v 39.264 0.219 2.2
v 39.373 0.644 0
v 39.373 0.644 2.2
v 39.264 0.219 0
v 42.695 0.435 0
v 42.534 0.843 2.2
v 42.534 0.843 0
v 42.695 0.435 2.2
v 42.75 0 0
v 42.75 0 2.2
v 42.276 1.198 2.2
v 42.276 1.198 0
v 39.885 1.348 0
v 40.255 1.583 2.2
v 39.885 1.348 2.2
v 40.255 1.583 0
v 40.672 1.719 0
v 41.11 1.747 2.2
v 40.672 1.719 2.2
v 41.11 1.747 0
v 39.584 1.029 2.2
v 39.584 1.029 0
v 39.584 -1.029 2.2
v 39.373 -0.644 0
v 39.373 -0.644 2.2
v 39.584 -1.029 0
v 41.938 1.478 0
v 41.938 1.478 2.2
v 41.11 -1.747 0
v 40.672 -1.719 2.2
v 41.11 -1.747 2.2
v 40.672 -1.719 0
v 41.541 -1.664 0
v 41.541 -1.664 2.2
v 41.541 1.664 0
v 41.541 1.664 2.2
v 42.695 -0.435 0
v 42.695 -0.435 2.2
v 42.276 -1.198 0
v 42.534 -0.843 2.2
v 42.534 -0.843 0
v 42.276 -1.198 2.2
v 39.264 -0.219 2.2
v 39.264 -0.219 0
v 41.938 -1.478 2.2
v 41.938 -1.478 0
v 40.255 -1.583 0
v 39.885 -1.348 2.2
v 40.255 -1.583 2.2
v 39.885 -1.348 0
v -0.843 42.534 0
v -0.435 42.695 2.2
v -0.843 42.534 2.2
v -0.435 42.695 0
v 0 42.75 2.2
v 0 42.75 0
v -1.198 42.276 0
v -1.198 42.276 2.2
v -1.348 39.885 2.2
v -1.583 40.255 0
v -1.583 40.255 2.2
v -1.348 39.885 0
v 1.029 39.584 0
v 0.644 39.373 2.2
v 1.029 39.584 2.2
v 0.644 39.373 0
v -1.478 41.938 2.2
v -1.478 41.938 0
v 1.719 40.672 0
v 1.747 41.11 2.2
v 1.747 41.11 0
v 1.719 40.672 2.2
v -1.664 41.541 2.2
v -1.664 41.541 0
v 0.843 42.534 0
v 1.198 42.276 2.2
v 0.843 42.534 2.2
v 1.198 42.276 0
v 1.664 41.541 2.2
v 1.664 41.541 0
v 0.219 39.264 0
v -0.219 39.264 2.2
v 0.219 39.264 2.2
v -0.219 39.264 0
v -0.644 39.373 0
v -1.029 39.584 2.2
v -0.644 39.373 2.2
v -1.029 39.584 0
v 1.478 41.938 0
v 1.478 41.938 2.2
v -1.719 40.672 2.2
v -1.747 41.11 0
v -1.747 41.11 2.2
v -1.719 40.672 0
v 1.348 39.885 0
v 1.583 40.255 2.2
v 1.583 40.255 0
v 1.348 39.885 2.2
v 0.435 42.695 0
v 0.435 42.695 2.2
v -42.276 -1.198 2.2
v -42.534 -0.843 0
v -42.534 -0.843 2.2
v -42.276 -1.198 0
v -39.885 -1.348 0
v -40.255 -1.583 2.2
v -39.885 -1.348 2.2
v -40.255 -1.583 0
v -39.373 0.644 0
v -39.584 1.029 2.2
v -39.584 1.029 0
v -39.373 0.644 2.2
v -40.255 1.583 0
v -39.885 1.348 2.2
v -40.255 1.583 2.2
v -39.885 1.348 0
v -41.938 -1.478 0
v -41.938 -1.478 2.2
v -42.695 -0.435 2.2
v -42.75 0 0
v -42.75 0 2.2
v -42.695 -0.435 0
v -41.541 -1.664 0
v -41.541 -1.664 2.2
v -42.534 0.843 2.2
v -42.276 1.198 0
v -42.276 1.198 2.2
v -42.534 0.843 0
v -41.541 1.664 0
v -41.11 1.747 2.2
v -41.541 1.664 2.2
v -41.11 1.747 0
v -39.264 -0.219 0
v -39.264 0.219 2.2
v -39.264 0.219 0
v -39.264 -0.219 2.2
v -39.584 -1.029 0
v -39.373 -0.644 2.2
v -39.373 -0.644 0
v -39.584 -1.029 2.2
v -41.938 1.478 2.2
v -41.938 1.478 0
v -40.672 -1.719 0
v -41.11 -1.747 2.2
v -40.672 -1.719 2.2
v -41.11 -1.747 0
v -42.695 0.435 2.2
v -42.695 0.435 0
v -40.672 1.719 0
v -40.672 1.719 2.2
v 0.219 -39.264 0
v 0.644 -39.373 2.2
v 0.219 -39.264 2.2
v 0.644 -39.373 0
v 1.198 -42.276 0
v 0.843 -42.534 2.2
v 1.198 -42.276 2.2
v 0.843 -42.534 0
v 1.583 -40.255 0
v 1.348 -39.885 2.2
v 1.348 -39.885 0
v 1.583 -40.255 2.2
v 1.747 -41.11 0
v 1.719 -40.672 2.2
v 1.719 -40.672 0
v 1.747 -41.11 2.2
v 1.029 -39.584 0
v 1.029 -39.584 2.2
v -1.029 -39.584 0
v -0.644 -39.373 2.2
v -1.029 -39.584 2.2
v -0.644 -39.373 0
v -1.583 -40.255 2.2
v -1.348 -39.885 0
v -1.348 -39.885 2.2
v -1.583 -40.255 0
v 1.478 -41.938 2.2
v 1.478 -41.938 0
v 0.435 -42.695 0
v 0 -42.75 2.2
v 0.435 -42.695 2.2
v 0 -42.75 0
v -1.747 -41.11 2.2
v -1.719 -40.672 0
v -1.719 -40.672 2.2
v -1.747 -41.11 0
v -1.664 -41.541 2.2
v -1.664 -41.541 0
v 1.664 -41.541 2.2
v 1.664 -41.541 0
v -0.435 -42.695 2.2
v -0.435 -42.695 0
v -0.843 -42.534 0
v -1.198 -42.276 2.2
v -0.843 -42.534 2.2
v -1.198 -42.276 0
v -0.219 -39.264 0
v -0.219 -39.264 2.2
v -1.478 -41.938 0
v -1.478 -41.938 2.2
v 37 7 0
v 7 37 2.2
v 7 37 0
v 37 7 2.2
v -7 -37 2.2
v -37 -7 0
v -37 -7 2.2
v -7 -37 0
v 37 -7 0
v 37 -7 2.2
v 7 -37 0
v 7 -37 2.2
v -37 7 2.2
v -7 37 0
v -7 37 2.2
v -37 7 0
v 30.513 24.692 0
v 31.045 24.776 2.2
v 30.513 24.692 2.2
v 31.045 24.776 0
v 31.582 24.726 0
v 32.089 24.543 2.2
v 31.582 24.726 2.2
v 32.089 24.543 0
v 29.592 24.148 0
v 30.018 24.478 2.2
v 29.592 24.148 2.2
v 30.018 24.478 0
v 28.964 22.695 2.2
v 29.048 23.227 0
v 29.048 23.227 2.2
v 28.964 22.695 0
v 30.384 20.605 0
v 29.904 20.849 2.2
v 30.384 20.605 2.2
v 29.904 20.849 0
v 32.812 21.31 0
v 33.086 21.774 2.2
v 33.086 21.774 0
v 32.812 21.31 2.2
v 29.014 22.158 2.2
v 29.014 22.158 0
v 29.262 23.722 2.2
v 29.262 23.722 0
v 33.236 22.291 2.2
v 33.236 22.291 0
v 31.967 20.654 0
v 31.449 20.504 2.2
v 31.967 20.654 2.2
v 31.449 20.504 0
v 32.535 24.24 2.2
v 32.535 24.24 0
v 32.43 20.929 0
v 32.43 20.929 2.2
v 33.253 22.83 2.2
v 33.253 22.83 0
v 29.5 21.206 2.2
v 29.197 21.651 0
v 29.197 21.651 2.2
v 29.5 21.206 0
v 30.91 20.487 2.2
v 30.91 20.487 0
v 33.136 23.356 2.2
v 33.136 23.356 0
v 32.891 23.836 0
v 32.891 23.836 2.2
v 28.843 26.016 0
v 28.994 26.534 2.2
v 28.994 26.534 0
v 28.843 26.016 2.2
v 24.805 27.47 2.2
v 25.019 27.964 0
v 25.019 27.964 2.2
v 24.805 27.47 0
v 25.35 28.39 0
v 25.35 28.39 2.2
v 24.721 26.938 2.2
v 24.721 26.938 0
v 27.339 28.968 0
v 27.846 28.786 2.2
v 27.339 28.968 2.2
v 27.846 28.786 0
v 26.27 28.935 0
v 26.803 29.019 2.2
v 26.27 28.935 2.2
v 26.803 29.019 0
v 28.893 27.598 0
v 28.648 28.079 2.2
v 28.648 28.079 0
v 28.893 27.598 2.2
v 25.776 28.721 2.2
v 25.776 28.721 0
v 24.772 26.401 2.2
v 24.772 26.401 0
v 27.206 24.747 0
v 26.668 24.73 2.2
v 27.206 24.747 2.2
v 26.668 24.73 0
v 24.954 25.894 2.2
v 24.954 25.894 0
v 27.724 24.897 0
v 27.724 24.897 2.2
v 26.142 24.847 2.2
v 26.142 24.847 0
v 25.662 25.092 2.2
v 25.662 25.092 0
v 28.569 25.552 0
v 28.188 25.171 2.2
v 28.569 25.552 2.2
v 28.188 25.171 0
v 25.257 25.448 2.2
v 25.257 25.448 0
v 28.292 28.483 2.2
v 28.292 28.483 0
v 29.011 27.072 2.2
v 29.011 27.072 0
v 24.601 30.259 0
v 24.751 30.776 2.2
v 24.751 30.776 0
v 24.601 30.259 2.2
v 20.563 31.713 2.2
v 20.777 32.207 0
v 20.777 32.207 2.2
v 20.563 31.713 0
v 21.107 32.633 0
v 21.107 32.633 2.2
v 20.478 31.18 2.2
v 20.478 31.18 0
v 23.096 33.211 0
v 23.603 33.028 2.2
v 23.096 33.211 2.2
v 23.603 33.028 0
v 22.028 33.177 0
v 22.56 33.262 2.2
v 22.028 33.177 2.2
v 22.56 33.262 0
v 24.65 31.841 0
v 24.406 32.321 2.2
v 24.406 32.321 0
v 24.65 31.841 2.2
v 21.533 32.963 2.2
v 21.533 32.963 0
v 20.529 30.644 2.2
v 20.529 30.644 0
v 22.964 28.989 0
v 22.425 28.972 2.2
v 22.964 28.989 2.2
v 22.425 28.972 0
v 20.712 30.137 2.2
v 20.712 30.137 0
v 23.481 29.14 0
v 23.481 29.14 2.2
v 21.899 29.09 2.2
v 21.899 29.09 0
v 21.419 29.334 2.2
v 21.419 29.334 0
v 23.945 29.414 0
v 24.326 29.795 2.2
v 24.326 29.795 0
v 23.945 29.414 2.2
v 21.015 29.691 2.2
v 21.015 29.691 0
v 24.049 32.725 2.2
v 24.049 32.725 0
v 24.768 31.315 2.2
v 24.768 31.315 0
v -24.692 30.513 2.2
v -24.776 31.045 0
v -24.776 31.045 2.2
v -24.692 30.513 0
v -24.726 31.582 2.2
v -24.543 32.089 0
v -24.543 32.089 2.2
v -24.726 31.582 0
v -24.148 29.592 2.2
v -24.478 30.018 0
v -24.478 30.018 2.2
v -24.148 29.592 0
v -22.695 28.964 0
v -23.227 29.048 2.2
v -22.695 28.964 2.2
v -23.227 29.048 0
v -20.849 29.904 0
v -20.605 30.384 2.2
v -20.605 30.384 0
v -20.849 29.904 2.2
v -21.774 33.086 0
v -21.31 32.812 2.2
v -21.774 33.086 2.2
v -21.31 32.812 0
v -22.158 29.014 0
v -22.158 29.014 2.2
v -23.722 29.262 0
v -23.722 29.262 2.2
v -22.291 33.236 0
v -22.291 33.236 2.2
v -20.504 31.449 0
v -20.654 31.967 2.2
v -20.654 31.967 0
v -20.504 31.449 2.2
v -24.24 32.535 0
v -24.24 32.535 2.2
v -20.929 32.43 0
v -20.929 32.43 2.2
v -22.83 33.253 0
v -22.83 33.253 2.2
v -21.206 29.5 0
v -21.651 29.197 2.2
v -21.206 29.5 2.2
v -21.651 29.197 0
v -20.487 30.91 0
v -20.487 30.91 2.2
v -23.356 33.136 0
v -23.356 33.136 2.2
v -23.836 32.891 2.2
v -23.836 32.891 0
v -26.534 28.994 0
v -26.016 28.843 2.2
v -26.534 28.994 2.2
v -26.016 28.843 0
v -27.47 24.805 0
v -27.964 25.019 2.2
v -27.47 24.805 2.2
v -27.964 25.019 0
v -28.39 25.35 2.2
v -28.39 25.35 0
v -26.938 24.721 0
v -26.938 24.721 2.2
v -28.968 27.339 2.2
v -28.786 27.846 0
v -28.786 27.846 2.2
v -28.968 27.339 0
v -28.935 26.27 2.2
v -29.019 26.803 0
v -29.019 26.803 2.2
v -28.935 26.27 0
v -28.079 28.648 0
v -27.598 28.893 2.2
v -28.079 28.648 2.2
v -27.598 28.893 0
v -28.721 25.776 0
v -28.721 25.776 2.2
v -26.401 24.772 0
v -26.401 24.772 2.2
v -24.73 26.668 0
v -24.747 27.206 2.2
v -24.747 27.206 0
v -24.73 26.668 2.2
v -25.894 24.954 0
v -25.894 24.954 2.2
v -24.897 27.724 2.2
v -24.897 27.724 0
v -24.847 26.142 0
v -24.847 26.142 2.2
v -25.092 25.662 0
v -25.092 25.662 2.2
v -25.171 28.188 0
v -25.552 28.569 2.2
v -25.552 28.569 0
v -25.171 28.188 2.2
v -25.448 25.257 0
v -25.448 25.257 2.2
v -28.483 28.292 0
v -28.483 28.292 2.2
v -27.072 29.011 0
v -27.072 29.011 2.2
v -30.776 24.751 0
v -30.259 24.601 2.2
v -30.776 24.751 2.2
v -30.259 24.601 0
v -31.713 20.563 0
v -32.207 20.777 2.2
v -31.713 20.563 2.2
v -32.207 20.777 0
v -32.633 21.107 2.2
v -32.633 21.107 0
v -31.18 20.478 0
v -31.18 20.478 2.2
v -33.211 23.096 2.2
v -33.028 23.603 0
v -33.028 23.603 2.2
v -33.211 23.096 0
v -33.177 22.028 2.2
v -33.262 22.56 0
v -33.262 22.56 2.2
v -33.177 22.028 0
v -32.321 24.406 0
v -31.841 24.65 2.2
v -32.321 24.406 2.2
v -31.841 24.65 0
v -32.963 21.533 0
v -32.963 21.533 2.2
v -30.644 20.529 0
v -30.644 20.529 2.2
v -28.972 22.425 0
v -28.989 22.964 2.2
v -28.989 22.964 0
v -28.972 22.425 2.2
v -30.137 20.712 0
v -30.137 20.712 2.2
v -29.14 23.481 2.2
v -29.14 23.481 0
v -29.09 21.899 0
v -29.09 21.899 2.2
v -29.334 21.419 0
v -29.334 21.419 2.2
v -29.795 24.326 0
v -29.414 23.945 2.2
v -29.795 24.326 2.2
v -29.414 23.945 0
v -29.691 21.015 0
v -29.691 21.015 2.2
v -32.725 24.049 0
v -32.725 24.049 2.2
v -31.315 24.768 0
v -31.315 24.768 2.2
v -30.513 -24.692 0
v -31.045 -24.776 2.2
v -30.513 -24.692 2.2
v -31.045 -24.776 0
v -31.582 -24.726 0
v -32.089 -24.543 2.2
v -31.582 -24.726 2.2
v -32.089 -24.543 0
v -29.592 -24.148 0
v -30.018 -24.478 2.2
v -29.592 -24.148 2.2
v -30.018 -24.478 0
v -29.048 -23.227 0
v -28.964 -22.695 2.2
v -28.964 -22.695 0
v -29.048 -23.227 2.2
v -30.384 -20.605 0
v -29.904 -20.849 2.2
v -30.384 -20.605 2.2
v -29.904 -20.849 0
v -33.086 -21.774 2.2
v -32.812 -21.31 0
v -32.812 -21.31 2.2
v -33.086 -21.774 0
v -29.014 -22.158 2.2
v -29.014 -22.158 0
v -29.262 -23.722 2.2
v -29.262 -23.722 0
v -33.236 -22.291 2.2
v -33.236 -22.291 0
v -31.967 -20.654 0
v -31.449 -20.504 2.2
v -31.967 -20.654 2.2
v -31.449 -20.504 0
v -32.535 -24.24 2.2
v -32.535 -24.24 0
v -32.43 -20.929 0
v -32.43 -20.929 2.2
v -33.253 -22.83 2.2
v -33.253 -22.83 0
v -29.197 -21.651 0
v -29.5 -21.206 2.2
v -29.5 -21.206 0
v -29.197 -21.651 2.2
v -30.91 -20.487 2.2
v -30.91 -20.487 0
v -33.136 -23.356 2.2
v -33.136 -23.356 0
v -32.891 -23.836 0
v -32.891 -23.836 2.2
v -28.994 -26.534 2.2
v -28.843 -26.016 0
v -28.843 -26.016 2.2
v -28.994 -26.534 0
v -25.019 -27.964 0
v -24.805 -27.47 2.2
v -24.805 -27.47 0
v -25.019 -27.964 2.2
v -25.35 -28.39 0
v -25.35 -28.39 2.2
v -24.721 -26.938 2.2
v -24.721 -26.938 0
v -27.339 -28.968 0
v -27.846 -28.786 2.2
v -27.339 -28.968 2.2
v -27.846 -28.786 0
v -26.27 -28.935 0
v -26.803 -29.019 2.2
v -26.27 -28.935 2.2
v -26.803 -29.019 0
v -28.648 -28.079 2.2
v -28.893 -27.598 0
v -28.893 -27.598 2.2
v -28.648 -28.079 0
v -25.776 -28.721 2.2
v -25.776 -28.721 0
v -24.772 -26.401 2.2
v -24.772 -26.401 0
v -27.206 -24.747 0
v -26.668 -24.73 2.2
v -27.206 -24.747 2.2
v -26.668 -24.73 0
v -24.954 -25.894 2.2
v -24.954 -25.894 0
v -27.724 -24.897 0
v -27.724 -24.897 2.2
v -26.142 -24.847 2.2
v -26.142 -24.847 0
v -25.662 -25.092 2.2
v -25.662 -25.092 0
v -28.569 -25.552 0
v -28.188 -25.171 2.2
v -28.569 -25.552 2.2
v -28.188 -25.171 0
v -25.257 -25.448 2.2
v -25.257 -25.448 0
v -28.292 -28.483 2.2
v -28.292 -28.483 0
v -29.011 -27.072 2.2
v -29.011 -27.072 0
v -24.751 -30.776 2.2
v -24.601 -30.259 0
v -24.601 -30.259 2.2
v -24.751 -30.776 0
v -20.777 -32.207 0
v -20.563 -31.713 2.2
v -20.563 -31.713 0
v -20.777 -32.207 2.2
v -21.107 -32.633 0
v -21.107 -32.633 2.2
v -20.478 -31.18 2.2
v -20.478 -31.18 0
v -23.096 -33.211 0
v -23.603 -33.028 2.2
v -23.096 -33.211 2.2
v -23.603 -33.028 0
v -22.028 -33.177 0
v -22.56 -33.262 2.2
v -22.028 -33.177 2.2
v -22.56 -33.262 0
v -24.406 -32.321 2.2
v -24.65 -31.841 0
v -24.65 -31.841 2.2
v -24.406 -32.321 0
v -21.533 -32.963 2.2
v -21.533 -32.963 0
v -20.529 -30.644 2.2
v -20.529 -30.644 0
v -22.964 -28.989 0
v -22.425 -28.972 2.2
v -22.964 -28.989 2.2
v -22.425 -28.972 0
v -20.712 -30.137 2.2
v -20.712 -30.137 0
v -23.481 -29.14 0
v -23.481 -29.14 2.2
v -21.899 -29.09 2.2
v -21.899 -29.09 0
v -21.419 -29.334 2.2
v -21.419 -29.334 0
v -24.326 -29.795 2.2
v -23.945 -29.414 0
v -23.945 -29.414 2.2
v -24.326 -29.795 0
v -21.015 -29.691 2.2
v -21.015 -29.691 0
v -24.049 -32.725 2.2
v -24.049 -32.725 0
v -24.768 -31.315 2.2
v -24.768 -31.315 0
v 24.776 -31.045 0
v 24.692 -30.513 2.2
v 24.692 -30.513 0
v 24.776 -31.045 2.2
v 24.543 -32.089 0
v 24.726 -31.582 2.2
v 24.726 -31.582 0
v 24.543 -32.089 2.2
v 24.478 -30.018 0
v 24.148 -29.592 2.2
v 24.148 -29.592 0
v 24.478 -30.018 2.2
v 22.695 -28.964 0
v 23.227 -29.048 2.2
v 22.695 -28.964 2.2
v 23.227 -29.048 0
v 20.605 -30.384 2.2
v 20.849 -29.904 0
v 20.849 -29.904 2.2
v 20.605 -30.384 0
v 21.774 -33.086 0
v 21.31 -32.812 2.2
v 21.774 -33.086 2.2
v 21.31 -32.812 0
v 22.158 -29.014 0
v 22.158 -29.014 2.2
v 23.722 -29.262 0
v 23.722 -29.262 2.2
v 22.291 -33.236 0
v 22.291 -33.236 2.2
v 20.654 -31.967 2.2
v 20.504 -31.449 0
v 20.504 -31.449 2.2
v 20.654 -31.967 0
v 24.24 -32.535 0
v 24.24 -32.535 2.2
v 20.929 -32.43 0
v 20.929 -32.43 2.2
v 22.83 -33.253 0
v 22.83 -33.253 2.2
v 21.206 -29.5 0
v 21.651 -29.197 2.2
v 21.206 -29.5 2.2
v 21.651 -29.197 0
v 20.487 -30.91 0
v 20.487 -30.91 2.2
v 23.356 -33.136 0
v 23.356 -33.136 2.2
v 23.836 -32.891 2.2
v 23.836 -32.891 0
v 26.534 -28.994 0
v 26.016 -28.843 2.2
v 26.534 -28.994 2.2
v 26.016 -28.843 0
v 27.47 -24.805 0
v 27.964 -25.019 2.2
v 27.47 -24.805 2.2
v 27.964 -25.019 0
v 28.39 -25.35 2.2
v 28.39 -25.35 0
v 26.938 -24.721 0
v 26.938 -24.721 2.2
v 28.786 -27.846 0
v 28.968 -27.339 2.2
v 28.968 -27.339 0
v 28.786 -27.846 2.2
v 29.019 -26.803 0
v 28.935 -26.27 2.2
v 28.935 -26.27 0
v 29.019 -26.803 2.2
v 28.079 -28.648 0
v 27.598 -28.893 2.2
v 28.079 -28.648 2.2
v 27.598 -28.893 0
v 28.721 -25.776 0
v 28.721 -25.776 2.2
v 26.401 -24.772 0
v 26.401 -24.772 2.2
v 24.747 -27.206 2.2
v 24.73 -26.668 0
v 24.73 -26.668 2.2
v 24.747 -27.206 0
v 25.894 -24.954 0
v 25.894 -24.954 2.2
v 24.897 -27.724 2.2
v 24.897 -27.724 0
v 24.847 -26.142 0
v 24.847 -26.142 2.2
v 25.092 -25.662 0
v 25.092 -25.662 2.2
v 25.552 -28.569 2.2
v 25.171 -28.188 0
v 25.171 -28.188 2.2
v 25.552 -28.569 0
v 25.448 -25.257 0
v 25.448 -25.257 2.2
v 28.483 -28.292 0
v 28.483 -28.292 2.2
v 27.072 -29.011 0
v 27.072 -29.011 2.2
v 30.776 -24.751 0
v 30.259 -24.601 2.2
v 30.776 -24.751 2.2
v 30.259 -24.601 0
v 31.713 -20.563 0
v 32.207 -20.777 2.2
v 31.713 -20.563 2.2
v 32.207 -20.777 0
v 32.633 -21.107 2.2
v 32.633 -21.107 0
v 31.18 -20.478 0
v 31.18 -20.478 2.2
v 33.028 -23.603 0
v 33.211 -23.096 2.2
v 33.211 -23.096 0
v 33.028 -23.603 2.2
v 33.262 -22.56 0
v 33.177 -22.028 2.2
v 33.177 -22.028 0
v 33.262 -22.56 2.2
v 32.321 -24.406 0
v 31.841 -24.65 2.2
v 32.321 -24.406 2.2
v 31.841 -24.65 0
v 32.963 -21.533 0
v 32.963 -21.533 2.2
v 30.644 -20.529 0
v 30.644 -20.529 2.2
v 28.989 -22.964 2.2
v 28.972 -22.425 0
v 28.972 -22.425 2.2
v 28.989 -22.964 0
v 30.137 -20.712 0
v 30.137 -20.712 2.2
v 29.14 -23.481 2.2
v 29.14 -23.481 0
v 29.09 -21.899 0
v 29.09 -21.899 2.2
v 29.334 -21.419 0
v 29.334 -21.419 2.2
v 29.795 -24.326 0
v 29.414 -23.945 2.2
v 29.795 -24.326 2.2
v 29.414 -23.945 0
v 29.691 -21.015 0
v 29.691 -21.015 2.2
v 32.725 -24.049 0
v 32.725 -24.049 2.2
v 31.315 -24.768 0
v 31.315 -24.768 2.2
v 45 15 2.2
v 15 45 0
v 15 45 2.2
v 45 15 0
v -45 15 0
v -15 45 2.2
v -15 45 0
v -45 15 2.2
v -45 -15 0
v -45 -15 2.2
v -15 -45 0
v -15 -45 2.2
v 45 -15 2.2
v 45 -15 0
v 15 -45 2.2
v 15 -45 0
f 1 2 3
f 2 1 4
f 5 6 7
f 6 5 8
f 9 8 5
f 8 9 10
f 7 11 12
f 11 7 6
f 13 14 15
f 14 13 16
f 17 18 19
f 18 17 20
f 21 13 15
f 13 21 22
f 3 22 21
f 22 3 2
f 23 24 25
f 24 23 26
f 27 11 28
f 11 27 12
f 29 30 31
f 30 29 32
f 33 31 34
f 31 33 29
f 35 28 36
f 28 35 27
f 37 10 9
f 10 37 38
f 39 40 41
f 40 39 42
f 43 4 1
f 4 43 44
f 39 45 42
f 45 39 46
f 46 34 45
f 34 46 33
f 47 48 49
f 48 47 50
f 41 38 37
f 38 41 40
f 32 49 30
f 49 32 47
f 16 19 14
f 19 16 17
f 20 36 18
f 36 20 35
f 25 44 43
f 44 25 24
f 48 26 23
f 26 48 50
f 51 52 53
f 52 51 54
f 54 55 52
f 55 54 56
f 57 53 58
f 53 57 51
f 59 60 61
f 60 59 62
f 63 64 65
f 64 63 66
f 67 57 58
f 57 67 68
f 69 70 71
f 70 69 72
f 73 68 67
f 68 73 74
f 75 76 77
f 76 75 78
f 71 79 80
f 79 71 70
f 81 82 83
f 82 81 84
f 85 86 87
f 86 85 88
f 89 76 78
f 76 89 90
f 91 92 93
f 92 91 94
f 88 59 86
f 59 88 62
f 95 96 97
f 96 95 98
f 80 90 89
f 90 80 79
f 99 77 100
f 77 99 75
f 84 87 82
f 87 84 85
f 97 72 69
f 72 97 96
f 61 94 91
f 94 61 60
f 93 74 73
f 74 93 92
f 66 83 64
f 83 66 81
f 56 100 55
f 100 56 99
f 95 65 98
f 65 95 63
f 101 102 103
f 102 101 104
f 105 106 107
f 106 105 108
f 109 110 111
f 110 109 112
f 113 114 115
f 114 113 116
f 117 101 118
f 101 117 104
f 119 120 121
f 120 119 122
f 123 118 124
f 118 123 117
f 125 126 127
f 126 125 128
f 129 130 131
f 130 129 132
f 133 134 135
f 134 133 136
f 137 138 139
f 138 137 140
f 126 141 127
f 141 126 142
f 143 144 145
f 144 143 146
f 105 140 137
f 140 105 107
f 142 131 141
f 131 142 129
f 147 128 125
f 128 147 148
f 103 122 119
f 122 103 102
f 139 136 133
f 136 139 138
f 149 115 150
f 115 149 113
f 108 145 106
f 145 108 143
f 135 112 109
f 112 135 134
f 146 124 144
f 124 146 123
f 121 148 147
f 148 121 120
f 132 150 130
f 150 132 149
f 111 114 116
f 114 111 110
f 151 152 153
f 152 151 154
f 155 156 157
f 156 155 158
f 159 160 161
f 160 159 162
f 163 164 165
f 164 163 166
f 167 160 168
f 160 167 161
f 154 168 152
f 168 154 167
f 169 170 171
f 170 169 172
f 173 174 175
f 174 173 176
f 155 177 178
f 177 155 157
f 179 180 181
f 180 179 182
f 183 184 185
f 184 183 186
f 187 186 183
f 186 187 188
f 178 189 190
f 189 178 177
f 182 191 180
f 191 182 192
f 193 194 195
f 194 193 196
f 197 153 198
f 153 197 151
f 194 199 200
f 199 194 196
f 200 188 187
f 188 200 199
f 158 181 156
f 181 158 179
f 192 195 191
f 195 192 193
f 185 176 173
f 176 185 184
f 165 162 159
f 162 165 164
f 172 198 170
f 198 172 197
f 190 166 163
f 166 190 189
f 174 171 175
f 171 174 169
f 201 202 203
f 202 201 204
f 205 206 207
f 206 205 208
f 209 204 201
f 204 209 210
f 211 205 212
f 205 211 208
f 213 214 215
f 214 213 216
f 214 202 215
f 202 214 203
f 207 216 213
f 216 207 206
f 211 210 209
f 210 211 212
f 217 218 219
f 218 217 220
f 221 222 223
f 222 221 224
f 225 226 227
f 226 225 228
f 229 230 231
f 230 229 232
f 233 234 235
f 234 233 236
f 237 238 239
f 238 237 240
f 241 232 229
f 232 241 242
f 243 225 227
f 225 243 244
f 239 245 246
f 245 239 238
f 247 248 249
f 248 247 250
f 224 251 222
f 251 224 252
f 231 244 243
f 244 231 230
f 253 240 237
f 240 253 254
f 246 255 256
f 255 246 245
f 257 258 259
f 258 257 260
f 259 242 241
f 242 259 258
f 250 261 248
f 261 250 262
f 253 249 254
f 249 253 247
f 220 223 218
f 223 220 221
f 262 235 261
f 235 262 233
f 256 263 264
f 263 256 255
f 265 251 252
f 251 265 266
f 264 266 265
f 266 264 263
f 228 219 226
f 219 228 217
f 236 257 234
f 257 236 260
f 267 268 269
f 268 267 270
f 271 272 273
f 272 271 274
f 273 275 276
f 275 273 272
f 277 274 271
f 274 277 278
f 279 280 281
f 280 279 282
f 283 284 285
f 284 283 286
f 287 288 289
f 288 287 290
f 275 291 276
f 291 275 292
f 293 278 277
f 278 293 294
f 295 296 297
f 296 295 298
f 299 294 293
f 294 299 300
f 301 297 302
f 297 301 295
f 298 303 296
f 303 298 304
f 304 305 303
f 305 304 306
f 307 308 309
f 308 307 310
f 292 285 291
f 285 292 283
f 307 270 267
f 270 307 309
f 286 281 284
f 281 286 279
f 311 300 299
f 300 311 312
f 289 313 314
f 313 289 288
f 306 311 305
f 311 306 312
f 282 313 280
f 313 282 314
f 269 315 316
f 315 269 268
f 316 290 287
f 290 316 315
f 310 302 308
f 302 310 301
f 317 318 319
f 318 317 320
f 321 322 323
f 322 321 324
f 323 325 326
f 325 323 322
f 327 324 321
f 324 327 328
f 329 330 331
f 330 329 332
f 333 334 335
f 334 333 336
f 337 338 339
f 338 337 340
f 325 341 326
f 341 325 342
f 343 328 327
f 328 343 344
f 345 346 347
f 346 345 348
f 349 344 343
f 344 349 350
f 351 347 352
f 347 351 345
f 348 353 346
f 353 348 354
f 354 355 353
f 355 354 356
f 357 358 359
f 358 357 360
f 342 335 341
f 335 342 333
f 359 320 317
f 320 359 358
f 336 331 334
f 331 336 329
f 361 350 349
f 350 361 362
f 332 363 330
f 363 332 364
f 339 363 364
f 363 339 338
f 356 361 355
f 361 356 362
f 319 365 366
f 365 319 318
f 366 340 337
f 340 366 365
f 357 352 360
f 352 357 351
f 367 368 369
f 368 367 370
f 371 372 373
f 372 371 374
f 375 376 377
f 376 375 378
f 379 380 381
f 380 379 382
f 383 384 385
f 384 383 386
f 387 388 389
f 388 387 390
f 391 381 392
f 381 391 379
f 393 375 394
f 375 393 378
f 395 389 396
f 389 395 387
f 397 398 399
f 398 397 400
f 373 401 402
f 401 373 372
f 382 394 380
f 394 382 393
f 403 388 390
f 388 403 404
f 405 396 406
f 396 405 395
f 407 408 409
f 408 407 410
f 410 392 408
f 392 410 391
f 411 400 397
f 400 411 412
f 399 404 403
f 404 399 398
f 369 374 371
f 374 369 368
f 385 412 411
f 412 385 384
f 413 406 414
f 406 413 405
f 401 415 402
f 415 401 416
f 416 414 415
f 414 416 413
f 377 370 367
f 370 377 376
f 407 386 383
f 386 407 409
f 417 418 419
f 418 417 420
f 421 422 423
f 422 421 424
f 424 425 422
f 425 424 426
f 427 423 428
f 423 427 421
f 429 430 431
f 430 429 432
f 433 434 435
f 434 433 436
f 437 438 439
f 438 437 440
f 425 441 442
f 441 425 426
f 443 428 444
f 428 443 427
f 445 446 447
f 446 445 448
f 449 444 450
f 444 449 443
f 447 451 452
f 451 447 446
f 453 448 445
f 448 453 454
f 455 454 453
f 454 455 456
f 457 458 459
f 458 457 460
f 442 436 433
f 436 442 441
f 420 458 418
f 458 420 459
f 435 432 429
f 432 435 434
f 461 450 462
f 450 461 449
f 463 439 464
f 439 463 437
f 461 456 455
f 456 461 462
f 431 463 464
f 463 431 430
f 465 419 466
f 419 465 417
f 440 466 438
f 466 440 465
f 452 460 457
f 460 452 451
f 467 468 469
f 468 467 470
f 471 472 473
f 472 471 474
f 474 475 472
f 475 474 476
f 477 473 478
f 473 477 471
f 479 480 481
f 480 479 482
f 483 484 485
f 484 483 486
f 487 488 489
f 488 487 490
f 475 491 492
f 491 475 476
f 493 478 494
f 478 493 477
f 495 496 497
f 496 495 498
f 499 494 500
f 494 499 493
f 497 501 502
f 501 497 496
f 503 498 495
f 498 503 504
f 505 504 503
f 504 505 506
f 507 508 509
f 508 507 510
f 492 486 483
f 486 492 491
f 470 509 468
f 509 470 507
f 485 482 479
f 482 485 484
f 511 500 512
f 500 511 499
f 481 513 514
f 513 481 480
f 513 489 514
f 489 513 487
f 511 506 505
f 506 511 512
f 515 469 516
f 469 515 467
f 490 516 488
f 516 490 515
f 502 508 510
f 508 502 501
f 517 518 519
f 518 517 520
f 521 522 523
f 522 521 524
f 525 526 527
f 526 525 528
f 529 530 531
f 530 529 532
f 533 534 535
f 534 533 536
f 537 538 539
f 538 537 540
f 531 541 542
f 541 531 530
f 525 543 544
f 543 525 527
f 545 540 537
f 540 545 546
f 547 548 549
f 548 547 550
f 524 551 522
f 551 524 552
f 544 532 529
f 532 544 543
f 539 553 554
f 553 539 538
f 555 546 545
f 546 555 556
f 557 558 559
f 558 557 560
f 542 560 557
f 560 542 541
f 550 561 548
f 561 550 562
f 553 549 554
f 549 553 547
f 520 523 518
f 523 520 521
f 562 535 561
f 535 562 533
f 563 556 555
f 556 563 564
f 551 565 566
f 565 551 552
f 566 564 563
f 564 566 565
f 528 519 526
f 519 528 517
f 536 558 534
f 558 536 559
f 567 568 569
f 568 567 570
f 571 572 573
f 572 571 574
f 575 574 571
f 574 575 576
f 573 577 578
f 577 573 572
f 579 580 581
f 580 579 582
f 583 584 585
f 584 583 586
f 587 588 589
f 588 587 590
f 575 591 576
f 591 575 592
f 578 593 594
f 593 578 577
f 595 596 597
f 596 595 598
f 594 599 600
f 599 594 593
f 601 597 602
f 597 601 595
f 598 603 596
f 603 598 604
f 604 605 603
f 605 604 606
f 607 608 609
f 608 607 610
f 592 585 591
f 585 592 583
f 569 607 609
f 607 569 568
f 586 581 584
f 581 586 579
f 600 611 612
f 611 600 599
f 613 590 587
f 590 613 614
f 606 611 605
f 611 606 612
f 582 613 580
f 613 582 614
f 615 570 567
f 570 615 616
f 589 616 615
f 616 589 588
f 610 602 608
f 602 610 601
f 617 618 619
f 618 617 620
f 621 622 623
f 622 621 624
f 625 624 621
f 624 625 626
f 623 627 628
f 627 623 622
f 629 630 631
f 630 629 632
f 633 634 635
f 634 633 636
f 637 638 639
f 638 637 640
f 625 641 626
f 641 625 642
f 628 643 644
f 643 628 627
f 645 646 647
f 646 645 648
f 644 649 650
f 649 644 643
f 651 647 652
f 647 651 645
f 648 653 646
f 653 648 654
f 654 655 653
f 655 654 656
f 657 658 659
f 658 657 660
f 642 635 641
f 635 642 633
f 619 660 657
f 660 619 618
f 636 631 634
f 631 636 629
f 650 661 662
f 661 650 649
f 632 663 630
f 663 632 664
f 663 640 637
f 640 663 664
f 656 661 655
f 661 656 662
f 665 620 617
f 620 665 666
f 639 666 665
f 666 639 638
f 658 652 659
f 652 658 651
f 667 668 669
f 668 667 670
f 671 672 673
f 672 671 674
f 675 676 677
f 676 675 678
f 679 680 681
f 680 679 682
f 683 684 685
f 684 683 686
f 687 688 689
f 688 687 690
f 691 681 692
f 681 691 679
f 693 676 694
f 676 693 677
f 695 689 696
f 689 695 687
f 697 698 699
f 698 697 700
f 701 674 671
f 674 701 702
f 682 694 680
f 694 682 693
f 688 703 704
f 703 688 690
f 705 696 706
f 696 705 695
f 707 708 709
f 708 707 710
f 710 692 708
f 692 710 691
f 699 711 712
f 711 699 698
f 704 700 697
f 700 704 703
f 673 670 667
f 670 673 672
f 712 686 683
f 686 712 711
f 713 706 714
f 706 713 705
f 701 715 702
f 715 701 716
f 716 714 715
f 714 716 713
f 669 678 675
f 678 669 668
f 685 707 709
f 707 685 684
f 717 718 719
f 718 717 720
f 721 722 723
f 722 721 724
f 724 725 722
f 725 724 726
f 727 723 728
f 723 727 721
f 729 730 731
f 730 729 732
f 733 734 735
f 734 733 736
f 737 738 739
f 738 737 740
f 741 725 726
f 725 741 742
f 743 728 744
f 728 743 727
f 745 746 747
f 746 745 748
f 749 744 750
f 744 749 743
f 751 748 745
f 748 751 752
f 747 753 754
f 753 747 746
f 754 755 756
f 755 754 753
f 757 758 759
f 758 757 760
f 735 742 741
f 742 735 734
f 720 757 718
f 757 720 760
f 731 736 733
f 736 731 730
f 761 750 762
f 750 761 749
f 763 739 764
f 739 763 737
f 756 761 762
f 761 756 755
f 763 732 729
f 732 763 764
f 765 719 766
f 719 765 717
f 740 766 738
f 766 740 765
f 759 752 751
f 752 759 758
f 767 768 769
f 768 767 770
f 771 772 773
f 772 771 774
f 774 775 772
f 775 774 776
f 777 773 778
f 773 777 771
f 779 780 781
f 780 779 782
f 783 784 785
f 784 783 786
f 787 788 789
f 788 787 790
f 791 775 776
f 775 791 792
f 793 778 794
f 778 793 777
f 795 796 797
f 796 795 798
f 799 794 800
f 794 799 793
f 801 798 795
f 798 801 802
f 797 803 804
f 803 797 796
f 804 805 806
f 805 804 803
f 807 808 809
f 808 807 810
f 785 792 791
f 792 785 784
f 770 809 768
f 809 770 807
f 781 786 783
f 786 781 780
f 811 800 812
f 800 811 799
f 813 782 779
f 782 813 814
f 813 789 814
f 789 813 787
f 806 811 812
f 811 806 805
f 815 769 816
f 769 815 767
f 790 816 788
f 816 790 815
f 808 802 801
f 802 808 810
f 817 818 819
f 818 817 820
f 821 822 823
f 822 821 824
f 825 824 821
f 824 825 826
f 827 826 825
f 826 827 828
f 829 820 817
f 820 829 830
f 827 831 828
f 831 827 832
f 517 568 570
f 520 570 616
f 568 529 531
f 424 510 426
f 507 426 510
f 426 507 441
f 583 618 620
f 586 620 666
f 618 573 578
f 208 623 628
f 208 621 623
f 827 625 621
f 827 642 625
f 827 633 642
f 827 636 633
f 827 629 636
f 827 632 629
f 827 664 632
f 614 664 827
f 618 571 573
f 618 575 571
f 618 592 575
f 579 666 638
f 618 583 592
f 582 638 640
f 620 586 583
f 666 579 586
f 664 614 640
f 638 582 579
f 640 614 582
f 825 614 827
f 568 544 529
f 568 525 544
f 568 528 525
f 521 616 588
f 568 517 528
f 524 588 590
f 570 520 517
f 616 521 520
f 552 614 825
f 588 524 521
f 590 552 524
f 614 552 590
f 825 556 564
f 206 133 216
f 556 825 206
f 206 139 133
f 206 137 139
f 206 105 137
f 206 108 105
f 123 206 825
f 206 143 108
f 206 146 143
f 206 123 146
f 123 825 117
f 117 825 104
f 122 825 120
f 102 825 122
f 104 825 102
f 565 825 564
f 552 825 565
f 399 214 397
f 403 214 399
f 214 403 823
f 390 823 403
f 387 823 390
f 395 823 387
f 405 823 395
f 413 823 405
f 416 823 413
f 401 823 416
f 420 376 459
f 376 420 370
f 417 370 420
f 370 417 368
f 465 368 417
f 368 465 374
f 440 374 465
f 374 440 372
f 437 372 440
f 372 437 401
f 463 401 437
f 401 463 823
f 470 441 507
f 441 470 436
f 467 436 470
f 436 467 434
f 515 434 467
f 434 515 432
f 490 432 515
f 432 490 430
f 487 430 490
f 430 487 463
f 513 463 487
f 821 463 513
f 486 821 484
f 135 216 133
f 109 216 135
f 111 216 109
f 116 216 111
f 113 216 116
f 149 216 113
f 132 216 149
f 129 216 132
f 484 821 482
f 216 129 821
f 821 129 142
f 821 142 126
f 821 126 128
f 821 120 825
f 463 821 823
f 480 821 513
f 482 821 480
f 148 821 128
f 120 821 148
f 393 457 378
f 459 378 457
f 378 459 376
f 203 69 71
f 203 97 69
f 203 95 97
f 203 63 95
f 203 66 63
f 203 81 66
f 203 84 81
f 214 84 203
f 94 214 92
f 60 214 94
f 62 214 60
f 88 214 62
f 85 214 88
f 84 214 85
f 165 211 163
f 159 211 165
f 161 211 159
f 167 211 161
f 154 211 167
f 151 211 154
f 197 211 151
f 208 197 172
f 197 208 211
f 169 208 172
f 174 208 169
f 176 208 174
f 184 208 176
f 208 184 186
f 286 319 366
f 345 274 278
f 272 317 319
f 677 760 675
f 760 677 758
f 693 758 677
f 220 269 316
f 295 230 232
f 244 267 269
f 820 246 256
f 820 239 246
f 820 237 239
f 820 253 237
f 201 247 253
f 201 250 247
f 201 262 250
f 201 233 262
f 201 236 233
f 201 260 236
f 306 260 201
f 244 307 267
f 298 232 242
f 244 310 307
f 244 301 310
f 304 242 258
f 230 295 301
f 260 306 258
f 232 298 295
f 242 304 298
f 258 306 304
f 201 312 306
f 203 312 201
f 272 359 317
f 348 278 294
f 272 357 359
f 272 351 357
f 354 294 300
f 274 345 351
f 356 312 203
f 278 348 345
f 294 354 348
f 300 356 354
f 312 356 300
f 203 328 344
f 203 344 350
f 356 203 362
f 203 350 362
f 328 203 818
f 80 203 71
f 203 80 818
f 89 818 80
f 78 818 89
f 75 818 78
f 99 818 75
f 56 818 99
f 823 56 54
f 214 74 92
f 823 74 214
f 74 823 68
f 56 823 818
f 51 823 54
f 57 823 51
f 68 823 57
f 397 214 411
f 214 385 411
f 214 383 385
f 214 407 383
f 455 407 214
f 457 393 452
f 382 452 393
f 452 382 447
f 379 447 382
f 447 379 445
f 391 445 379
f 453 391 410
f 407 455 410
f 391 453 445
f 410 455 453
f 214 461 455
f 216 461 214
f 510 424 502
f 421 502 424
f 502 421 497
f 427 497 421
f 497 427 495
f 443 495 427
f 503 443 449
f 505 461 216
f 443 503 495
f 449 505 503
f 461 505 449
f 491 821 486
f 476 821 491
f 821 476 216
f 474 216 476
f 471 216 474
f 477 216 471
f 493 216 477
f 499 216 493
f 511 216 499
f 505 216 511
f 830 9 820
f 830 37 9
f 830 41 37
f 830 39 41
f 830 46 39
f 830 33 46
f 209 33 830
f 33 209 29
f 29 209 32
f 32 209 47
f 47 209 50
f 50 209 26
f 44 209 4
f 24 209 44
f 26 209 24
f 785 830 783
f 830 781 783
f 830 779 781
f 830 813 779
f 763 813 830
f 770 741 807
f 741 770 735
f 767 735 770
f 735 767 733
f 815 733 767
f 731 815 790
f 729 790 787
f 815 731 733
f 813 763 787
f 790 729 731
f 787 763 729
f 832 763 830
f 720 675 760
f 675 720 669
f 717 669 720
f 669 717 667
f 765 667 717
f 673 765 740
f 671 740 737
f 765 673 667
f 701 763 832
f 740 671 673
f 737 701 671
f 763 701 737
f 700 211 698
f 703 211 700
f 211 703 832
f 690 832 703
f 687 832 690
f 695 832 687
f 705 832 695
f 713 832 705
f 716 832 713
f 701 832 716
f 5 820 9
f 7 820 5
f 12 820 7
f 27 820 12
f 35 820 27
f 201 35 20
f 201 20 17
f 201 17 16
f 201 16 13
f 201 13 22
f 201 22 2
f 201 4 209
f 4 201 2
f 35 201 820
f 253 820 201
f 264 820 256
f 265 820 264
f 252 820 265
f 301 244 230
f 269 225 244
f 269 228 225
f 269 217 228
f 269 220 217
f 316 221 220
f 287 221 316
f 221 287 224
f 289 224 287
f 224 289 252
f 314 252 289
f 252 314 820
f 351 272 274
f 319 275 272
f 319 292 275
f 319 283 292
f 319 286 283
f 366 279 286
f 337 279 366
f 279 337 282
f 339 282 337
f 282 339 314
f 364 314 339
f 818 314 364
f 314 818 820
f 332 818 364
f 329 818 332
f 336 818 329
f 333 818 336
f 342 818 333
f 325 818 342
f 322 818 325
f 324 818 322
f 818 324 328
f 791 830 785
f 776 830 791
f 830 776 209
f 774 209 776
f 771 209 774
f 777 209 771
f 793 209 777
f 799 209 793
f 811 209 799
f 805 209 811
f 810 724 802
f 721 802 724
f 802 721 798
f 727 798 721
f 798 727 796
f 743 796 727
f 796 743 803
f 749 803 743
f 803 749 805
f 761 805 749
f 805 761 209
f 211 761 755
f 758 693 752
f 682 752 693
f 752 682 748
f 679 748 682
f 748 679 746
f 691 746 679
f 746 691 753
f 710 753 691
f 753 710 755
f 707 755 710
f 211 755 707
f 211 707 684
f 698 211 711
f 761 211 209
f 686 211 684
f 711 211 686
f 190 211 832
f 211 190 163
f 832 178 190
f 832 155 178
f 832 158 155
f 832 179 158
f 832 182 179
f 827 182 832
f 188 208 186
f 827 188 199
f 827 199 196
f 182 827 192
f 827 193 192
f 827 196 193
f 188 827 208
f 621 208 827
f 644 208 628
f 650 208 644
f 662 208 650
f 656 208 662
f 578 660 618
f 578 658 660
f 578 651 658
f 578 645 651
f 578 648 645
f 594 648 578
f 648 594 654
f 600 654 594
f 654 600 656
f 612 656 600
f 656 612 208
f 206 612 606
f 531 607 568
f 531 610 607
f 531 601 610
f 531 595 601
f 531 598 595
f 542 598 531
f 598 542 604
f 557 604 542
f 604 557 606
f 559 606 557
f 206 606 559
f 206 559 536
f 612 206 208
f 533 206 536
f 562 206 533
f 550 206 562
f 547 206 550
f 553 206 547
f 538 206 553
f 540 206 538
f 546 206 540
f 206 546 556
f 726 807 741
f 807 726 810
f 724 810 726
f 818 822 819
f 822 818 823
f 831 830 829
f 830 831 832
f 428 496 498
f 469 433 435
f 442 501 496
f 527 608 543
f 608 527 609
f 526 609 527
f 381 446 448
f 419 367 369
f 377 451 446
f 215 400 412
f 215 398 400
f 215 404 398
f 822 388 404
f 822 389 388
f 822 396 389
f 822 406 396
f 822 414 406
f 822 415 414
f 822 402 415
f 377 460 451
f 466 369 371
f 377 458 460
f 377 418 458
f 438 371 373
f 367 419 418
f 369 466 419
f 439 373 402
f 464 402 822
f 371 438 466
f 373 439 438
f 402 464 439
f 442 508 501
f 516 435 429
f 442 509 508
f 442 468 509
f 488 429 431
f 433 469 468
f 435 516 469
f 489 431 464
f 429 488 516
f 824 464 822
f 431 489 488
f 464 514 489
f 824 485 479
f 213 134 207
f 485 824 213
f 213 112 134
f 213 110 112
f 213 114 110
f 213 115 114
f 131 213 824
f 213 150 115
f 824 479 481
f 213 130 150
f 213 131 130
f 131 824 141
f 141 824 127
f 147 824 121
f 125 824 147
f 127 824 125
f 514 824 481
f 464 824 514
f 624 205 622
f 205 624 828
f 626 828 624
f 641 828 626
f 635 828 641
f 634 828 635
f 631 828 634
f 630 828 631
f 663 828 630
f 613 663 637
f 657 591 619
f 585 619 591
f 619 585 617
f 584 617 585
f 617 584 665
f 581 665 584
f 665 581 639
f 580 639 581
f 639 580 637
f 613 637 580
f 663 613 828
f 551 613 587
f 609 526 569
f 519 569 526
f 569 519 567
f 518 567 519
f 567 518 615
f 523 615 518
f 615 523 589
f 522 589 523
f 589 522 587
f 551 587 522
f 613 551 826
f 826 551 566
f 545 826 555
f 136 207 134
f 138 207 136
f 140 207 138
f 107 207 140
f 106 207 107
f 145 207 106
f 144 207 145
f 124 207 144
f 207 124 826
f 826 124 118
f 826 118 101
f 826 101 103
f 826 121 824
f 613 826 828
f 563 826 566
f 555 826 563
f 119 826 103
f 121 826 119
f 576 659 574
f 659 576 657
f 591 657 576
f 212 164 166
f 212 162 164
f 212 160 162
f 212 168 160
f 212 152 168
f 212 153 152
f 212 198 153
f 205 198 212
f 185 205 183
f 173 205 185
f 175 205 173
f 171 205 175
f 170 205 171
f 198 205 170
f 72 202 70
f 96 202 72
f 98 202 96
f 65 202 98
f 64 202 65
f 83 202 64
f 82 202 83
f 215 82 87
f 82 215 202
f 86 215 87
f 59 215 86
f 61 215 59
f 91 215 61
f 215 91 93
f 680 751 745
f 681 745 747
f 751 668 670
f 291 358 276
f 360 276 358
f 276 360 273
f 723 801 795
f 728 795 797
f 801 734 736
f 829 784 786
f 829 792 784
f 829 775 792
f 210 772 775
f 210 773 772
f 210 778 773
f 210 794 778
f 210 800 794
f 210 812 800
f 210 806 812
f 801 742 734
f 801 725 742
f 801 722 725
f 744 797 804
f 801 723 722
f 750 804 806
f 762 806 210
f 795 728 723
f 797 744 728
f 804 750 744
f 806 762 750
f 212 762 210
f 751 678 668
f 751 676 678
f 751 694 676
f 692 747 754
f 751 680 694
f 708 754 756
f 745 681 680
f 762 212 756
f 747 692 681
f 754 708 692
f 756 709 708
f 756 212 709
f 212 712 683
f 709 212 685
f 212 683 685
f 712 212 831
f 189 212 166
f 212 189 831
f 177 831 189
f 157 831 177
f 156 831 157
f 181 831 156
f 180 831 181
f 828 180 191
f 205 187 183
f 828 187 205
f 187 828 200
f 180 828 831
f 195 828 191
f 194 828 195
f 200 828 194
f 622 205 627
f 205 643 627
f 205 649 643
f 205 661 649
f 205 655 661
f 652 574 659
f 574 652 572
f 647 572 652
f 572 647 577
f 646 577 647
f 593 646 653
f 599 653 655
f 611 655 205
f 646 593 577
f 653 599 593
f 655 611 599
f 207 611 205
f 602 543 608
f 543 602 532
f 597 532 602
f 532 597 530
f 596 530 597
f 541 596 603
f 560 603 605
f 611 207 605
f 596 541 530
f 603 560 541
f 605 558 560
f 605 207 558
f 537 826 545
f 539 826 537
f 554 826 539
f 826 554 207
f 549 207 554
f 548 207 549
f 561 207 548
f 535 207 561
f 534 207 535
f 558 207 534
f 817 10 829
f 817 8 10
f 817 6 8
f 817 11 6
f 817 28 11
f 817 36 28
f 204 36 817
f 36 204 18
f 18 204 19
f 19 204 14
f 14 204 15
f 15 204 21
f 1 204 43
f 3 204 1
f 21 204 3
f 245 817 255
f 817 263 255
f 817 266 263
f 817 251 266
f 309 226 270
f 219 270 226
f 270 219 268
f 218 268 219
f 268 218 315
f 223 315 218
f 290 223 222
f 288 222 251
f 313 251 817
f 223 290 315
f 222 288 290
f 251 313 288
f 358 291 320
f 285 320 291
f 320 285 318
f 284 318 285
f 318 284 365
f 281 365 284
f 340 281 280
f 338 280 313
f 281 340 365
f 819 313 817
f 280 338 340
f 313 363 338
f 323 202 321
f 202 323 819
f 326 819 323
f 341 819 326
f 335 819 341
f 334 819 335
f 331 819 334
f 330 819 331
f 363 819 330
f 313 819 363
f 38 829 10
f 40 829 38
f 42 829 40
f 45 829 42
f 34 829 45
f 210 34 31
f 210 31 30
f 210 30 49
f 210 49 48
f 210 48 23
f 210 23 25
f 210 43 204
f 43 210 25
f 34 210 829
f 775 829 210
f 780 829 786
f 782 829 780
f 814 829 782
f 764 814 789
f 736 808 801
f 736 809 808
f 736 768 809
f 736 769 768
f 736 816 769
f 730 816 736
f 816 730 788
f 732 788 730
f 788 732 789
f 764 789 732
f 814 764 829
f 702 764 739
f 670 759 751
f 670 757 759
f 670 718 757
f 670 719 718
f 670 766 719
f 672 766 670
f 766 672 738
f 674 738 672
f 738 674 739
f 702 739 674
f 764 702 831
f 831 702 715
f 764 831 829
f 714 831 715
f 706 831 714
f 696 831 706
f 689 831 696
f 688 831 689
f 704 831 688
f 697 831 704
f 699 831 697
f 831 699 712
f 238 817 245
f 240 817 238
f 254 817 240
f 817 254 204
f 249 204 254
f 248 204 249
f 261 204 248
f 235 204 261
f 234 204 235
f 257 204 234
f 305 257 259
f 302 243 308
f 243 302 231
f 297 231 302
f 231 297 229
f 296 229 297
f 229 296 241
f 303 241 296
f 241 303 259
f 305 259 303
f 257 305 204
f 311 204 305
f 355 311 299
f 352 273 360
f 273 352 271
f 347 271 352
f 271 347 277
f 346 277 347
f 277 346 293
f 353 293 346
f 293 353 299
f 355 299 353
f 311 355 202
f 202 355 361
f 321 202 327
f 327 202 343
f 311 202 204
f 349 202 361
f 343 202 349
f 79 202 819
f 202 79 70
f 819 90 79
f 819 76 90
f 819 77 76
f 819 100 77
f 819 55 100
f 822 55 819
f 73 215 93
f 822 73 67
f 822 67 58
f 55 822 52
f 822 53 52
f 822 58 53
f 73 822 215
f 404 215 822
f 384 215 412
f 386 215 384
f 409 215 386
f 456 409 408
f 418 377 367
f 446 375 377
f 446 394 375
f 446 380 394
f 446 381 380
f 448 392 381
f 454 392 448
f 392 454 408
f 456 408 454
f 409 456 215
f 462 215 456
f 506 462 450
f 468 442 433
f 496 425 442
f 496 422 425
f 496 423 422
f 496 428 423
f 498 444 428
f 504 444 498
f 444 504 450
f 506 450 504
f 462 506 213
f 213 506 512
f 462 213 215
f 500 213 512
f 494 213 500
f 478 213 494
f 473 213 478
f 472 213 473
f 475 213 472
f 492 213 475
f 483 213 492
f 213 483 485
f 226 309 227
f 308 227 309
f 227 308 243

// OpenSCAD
// file: ../util/hole3.scad
module hole3()
{
    cylinder(d=3.5, h=99, center=true);
}
// file: ../util/repeat4.scad
module repeat4()
{
    for (r=[0:3])
    rotate([0,0,90*r])
    children();
}
// file: ../util/hexapath.scad
// Follow an hexagonal path
module hexapath(X, Y, thickness, center=false)
{
    union() {
        linear_extrude(thickness, center=center)
            polygon(points=[
                    [X, Y], [X, -Y], 
                    [Y, -X], [-Y, -X],
                    [-X, -Y], [-X, Y],
                    [-Y, X], [Y, X], 
            ]);
    }
}
// file: ../models/ollo.scad
// Diameter of plastic ollo holes
OlloHoles = 4.3;

// Width of Ollo "real" plastic
OlloWidth = 3;

// Distance between two ollo holes
OlloSpacing = 6;

// Do an Ollo hole on the part
module olloHole(depth=2.2)
{
    translate([0,0,-0.1])
      cylinder(depth+0.2, OlloHoles/2, OlloHoles/2);
}

// Do 3 ollo holes
module threeOllo(depth=2.2)
{
  for (xy=[[-OlloSpacing,0],[0,0],[OlloSpacing,0]]) {
    translate([xy[0], xy[1], 0])
    olloHole(depth);
  }
}

// Do a servo arm holes
module servoArm(depth=2.2)
{
    threeOllo(depth);
    rotate([0,0,90])
      threeOllo(depth);
}
// main file
use <../models/ollo.scad>;
use <../util/hexapath.scad>;
use <../util/repeat4.scad>;
use <../util/hole3.scad>;

$fn=25;

module body(thickness=2.2, type="top", print=false) {
    // The layout path
    X=45;
    Y=15;
    
    difference() {
        // Making the exernal path
        hexapath(X, Y, thickness=thickness);
        
        if (type == "top") {
            // Craving the board to make it accessible
            hexapath(X-8, Y-8, thickness=99, center=true);
            
            // Adding holes for the magnets
            repeat4()
            translate([41,0,0])
            hole3();
        } else if (type == "bottom") {
            // Adding holes for the XBoard
            repeat4()
            translate([35, 11.5, 0])
            hole3();
        }
        
        // Motors fixation
        repeat4()
        rotate([0,0,45])
        translate([38,0,0])
        rotate([0,0,90])
        threeOllo();
    }
    
}

body(type="top");
